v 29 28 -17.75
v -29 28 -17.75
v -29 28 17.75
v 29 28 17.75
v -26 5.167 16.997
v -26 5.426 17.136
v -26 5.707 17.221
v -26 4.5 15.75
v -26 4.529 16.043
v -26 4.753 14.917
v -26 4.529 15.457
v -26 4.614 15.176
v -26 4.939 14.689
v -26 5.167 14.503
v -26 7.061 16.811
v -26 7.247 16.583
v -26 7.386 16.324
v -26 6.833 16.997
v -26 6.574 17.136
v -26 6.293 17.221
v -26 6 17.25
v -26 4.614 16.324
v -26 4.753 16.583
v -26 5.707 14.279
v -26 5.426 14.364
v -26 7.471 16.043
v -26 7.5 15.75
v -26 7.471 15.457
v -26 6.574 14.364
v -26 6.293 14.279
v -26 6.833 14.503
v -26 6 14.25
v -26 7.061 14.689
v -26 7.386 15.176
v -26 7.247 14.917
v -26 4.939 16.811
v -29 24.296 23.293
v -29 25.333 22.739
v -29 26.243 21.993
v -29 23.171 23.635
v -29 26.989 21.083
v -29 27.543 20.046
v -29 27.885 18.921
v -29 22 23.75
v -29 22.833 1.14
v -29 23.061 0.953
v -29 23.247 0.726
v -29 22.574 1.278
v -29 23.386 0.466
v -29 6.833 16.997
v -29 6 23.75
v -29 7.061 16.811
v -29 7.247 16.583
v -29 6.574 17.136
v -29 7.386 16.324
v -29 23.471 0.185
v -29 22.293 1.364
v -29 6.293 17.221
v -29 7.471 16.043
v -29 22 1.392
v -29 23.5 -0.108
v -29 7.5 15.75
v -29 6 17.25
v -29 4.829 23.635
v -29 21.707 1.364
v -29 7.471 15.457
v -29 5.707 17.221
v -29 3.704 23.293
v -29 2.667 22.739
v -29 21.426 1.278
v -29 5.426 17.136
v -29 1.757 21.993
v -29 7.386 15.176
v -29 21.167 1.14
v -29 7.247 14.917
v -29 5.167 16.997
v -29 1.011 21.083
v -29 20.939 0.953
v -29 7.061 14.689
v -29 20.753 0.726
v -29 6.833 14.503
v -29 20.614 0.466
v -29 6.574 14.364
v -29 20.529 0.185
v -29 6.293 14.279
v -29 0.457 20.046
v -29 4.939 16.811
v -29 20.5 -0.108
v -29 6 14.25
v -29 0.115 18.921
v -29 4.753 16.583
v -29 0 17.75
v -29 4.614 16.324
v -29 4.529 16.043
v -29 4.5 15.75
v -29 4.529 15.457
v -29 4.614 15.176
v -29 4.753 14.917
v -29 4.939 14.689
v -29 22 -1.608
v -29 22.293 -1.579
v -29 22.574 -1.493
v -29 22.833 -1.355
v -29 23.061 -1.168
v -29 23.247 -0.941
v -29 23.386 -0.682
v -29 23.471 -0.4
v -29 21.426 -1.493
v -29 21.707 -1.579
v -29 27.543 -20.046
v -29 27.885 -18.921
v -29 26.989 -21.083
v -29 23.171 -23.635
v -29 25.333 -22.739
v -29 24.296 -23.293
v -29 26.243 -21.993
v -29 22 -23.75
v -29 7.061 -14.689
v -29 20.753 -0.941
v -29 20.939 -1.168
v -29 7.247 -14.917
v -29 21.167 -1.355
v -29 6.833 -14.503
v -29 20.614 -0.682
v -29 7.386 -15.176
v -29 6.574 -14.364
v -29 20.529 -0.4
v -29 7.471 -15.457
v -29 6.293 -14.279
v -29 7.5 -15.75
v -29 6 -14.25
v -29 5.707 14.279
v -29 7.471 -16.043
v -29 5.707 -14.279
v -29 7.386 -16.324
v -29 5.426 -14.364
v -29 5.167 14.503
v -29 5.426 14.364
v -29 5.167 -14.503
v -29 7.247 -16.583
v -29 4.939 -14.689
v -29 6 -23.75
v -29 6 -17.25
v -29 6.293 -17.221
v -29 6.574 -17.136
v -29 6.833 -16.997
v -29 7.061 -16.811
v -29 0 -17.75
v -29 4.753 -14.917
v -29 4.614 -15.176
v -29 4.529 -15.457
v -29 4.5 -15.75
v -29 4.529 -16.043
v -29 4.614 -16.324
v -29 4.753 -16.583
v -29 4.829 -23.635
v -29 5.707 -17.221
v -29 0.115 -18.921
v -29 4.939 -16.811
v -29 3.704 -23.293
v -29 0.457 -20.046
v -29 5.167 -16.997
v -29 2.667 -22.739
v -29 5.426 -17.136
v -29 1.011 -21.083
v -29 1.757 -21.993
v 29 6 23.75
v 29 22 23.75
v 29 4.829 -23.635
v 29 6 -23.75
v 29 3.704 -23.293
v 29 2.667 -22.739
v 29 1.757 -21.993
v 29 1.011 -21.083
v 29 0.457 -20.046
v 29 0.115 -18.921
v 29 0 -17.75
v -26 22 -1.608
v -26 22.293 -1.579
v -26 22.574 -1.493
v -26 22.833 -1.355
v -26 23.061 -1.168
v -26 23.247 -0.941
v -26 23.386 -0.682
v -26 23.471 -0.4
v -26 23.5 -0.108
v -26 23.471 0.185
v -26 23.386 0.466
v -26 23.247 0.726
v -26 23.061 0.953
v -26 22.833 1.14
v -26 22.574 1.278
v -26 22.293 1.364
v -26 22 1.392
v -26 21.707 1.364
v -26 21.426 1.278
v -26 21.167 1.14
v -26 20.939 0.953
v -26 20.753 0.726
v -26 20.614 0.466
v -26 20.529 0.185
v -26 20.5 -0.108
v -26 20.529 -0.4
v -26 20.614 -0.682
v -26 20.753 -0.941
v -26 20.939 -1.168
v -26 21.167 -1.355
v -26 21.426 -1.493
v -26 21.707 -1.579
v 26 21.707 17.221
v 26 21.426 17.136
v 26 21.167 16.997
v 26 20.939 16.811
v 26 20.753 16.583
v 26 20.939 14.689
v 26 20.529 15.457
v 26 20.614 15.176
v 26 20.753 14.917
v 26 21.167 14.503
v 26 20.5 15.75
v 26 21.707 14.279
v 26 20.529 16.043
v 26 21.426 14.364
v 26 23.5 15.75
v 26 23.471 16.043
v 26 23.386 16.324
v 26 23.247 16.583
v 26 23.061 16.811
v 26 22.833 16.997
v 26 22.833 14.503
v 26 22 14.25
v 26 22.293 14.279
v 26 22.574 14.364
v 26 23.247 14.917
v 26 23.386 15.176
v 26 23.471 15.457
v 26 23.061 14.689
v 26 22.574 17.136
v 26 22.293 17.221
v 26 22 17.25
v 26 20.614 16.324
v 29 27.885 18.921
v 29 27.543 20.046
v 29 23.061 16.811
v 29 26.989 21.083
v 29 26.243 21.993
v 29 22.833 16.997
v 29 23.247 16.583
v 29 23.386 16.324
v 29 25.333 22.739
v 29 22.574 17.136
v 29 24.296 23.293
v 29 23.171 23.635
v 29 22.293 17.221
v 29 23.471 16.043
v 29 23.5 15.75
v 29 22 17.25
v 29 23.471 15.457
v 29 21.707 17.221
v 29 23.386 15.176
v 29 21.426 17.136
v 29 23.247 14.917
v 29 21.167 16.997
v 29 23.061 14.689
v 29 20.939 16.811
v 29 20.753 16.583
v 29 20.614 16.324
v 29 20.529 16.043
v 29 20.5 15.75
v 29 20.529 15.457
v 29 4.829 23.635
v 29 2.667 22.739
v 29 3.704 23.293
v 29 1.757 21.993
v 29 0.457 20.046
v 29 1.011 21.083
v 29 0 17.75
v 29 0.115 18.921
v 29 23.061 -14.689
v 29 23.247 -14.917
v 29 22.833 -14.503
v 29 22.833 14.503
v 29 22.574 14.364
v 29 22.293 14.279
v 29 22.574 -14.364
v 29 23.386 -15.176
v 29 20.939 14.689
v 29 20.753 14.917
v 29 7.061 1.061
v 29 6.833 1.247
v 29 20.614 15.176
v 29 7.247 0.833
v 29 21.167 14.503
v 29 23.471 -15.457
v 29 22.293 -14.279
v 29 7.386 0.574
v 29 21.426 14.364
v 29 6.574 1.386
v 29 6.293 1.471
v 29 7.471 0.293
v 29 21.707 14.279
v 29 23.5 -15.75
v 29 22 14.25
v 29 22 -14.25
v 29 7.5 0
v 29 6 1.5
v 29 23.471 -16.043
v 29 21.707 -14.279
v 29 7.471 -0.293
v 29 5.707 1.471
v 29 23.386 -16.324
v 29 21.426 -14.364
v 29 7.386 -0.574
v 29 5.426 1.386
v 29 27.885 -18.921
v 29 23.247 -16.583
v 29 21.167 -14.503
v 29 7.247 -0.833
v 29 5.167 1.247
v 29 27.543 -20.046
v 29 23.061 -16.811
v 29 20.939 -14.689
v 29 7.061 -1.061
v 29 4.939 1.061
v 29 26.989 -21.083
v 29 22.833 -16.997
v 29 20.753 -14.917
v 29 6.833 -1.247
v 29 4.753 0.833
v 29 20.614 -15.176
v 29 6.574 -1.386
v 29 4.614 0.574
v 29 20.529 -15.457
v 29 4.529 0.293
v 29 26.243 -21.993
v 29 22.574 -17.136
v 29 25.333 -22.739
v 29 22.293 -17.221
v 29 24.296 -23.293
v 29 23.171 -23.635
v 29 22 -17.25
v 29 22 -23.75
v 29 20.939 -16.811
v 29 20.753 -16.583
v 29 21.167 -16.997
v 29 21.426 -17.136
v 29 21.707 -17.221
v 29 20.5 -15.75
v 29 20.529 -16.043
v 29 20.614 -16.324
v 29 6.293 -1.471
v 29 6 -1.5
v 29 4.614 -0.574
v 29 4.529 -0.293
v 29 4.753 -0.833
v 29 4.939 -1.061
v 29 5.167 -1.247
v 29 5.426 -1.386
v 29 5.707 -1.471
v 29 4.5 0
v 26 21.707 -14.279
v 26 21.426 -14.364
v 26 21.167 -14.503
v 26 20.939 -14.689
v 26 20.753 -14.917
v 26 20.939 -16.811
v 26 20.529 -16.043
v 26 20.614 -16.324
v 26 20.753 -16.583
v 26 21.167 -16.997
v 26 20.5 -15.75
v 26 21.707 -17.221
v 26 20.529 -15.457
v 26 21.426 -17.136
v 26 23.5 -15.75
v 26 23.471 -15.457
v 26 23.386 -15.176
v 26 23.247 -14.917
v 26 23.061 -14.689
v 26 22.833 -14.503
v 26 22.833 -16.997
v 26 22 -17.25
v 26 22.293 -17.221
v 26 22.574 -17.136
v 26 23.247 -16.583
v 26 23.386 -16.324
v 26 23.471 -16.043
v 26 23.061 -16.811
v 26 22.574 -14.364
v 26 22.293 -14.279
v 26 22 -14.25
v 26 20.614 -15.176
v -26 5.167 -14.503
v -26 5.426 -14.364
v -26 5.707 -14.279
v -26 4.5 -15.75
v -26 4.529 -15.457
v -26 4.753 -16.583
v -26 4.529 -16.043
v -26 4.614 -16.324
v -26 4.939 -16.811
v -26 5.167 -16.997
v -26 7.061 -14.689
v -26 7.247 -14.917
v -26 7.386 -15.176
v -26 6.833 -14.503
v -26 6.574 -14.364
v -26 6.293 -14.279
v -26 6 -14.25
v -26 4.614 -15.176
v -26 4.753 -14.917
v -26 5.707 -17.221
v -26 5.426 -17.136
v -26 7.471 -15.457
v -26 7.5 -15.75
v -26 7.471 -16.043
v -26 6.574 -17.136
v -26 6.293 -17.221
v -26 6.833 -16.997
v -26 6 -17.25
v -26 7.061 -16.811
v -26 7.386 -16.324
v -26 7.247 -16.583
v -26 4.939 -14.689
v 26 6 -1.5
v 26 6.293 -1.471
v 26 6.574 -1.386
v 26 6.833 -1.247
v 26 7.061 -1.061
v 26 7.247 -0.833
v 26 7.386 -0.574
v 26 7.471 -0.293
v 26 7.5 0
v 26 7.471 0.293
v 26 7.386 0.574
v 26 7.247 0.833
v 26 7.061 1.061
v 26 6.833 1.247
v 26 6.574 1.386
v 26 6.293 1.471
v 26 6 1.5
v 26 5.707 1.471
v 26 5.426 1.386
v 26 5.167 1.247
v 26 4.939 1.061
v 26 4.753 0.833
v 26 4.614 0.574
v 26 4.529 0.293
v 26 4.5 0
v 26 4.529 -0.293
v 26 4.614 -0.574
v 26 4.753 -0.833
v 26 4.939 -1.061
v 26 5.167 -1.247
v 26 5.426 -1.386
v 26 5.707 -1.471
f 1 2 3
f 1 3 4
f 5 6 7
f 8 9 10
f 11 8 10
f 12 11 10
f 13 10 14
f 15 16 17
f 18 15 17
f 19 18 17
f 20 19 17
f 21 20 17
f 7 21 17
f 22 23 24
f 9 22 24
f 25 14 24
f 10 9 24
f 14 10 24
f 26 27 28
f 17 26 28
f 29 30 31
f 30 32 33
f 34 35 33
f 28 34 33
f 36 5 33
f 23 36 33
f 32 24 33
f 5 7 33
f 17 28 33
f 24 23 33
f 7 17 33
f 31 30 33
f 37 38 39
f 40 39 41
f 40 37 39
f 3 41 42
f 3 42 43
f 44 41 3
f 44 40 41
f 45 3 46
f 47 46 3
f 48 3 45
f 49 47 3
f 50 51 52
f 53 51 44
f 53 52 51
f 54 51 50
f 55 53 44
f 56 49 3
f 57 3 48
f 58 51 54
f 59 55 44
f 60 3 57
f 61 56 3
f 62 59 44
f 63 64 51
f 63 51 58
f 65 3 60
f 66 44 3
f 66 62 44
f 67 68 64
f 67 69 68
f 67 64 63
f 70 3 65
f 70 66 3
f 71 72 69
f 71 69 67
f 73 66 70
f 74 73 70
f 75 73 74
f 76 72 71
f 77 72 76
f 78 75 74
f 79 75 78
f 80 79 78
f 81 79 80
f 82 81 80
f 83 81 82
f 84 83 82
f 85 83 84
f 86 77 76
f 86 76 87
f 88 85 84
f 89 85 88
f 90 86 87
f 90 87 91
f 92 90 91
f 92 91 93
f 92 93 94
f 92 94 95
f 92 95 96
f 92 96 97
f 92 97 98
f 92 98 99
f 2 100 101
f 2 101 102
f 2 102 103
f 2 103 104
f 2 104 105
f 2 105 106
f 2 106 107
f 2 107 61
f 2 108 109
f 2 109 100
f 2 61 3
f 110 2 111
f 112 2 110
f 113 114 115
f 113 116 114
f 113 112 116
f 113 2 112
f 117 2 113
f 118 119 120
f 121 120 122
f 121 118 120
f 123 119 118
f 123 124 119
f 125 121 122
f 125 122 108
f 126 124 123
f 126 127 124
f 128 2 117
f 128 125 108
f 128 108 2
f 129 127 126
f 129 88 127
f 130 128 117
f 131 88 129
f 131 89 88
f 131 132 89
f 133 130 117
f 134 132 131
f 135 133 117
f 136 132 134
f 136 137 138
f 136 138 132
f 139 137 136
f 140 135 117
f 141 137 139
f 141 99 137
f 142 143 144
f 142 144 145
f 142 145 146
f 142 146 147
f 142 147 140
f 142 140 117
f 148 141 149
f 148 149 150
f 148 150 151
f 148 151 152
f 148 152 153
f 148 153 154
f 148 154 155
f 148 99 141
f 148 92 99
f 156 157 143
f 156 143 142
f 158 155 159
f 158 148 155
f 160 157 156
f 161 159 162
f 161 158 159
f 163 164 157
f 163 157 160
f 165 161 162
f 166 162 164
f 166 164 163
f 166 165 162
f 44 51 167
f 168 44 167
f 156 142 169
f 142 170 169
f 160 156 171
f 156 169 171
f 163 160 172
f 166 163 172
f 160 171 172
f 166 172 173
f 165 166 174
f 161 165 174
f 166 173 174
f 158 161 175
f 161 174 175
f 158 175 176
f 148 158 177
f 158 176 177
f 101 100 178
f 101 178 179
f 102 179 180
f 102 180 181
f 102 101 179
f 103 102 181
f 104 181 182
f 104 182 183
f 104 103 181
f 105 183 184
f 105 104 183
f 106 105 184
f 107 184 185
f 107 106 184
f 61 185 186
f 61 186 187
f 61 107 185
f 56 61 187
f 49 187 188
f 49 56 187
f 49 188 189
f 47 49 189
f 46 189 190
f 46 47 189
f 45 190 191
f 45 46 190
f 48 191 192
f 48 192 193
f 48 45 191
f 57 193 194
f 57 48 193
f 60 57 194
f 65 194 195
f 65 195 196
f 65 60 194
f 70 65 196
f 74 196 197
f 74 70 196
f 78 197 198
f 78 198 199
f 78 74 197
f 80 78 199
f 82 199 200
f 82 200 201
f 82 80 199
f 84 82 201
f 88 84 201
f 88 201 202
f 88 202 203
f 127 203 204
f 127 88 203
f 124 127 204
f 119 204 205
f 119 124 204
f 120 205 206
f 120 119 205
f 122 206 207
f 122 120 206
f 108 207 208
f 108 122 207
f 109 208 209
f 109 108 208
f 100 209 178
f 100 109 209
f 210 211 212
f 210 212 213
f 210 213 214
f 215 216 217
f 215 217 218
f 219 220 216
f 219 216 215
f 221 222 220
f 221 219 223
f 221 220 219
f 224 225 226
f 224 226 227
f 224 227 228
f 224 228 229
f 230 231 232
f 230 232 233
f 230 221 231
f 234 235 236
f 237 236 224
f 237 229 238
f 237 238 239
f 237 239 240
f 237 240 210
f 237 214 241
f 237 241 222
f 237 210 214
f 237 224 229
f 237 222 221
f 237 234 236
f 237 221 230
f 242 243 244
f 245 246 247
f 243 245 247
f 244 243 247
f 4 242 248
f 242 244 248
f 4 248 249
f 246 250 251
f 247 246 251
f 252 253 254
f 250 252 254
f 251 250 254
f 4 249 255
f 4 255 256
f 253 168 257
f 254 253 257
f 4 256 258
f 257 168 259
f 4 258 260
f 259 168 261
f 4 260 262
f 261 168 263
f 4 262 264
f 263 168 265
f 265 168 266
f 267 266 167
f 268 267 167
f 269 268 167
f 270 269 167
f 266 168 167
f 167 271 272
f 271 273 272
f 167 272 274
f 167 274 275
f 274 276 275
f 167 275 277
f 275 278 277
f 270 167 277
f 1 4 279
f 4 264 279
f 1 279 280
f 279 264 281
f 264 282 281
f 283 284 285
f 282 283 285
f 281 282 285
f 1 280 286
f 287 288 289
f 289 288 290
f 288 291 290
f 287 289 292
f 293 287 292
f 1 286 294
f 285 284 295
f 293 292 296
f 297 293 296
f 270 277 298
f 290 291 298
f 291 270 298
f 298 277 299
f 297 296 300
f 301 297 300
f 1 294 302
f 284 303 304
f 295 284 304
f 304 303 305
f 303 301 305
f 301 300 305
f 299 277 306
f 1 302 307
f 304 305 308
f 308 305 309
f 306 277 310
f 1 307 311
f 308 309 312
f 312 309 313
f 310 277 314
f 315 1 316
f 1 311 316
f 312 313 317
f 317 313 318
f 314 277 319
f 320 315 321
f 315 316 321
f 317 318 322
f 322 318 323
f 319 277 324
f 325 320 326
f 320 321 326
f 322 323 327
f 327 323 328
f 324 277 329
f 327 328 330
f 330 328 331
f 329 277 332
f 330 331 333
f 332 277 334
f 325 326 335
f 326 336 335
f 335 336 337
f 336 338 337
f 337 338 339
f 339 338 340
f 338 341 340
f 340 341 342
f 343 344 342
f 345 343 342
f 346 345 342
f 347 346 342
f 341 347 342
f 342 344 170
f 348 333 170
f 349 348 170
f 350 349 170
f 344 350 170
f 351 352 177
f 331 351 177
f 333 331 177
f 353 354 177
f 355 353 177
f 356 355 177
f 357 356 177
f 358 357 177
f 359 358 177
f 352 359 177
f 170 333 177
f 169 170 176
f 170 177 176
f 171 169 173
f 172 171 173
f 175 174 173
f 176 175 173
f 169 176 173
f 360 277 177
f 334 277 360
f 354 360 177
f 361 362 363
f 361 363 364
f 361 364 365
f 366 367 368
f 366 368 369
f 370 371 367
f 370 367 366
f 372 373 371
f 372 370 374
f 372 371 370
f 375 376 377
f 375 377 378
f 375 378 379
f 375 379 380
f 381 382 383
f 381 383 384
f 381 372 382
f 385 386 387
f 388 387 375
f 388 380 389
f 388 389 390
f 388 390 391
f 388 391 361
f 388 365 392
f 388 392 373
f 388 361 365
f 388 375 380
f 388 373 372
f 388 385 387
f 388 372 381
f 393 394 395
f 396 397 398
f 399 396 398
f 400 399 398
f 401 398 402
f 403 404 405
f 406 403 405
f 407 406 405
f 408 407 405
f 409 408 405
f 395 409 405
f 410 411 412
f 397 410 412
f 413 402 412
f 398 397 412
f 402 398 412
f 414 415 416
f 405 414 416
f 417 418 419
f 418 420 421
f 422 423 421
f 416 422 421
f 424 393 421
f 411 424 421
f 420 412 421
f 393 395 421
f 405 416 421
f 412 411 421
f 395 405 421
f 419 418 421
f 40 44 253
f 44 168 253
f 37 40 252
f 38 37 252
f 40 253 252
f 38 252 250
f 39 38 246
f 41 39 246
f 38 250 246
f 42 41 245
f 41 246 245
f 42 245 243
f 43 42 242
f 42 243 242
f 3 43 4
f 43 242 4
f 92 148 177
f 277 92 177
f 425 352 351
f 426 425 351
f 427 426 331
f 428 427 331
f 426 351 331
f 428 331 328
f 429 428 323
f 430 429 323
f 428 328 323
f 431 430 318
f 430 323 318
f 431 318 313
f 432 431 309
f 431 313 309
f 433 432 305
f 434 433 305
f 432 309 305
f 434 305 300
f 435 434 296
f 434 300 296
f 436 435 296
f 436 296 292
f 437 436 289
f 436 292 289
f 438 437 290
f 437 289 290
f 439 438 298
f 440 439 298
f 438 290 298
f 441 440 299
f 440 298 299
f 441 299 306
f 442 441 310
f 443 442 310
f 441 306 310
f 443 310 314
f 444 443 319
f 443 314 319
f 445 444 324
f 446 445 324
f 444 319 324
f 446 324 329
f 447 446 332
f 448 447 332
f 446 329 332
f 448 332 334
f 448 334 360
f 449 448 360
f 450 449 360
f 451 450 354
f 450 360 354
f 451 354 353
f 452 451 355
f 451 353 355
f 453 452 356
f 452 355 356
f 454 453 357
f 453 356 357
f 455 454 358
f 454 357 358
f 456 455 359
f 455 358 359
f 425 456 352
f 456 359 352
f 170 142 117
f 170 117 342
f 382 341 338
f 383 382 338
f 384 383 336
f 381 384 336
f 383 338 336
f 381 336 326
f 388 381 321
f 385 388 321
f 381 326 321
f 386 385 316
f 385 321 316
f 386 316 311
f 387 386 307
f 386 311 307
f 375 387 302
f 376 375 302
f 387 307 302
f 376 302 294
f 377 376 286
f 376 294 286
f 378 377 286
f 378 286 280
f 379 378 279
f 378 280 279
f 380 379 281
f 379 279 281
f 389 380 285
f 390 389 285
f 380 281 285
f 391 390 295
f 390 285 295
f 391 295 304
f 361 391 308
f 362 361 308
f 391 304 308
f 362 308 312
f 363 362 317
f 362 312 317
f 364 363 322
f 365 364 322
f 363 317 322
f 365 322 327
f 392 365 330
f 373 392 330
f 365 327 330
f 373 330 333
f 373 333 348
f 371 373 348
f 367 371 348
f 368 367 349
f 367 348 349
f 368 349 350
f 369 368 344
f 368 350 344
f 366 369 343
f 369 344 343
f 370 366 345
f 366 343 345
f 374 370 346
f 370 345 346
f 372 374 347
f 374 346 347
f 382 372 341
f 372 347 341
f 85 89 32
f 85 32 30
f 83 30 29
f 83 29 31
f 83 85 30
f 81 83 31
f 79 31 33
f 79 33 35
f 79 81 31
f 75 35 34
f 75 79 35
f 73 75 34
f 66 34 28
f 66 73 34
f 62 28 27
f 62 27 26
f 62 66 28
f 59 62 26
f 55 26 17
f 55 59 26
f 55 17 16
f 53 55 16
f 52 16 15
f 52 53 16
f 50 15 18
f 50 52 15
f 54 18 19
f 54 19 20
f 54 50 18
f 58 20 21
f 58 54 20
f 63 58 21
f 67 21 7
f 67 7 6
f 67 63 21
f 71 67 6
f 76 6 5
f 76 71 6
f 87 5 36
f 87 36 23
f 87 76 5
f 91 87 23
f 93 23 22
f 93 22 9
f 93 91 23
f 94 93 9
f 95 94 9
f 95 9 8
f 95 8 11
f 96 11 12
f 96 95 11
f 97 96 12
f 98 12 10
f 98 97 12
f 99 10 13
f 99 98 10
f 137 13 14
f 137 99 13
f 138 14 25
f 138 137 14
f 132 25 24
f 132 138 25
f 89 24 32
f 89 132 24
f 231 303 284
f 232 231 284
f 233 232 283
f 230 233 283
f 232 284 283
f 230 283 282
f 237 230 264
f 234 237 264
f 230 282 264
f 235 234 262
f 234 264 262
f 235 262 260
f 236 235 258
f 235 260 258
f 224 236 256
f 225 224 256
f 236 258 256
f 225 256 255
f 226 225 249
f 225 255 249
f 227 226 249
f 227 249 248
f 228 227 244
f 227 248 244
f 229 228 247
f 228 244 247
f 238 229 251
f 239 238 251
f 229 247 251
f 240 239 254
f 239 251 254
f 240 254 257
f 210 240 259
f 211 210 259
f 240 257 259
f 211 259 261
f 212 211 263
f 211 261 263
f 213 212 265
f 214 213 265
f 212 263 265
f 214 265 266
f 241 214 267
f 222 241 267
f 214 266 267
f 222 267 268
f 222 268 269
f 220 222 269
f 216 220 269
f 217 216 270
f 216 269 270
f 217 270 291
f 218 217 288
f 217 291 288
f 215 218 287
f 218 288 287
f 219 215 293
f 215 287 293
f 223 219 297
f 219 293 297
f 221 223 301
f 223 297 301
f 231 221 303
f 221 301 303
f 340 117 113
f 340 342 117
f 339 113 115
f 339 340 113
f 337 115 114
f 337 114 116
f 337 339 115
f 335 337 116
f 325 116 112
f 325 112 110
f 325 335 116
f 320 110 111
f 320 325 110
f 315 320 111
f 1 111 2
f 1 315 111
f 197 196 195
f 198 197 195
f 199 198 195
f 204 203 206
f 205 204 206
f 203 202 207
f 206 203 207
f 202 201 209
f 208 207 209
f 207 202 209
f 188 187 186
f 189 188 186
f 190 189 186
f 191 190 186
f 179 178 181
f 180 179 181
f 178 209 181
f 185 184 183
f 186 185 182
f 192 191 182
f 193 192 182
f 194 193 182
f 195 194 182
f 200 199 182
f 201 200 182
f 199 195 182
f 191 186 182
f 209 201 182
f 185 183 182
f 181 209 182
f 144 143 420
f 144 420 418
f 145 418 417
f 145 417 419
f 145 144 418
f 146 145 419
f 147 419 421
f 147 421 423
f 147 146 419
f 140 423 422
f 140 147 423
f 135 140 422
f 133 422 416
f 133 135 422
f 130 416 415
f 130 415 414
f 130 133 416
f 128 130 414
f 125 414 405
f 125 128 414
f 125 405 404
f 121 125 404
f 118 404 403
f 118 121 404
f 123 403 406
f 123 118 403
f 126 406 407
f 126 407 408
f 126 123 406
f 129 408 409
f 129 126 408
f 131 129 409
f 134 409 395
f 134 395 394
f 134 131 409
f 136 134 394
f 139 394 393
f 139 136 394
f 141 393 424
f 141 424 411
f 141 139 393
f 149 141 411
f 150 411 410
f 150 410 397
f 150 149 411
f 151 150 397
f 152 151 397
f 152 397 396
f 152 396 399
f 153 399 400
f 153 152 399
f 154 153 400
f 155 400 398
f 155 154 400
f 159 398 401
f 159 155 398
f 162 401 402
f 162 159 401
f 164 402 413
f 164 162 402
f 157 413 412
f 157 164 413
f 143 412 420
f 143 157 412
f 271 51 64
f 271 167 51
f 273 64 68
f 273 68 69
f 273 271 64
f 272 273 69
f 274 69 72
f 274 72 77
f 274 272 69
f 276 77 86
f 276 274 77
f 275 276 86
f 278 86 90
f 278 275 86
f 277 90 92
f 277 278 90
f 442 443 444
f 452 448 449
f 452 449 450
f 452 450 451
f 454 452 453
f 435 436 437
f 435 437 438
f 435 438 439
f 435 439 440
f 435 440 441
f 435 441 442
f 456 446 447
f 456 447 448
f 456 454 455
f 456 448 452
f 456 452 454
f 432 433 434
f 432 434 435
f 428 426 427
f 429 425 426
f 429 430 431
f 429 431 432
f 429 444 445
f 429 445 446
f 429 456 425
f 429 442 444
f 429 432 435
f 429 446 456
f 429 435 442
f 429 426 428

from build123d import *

# Parameters (mm, degrees)
SKETCH1_W           = 58
SKETCH1_H           = 47.5
BOSS_EXTRUDE1_DEPTH = 28
FILLET3_R           = 6
SKETCH2_R           = 1.5
CUT_EXTRUDE1_DEPTH  = 3
CUT_EXTRUDE2_START  = -29
SKETCH3_R           = 1.5
CUT_EXTRUDE2_DEPTH  = 3


with BuildPart() as part:
    # Sketch1 → Boss-Extrude1 (new body)
    with BuildSketch(Plane(origin=(0, 0, 0), x_dir=(1, 0, 0), z_dir=(0, 1, 0))):
        Rectangle(SKETCH1_W, SKETCH1_H)
    extrude(amount=BOSS_EXTRUDE1_DEPTH)

    # Fillet3
    fillet3_edges = [part.edges().sort_by_distance(p)[0] for p in [
        (0, 28, 23.75),
        (0, 0, 23.75),
        (0, 0, -23.75),
        (0, 28, -23.75),
    ]]
    fillet(fillet3_edges, radius=FILLET3_R)

    # Sketch2 → Cut-Extrude1 (cut)
    with BuildSketch(Plane(origin=(29, 0, 0), x_dir=(0, 0, -1), z_dir=(1, 0, 0))):
        with Locations((0, 6)):
            Circle(SKETCH2_R)
        with Locations((-15.75, 22)):
            Circle(SKETCH2_R)
        with Locations((15.75, 22)):
            Circle(SKETCH2_R)
    extrude(amount=-CUT_EXTRUDE1_DEPTH, mode=Mode.SUBTRACT)

    # Sketch3 → Cut-Extrude2 (cut)
    with BuildSketch(Plane(origin=(0, 0, 0), x_dir=(0, 0, -1), z_dir=(1, 0, 0)).offset(CUT_EXTRUDE2_START)):
        with Locations((0.107591006, 22)):
            Circle(SKETCH3_R)
        with Locations((-15.75, 6)):
            Circle(SKETCH3_R)
        with Locations((15.75, 6)):
            Circle(SKETCH3_R)
    extrude(amount=CUT_EXTRUDE2_DEPTH, mode=Mode.SUBTRACT)


solid = part.part
